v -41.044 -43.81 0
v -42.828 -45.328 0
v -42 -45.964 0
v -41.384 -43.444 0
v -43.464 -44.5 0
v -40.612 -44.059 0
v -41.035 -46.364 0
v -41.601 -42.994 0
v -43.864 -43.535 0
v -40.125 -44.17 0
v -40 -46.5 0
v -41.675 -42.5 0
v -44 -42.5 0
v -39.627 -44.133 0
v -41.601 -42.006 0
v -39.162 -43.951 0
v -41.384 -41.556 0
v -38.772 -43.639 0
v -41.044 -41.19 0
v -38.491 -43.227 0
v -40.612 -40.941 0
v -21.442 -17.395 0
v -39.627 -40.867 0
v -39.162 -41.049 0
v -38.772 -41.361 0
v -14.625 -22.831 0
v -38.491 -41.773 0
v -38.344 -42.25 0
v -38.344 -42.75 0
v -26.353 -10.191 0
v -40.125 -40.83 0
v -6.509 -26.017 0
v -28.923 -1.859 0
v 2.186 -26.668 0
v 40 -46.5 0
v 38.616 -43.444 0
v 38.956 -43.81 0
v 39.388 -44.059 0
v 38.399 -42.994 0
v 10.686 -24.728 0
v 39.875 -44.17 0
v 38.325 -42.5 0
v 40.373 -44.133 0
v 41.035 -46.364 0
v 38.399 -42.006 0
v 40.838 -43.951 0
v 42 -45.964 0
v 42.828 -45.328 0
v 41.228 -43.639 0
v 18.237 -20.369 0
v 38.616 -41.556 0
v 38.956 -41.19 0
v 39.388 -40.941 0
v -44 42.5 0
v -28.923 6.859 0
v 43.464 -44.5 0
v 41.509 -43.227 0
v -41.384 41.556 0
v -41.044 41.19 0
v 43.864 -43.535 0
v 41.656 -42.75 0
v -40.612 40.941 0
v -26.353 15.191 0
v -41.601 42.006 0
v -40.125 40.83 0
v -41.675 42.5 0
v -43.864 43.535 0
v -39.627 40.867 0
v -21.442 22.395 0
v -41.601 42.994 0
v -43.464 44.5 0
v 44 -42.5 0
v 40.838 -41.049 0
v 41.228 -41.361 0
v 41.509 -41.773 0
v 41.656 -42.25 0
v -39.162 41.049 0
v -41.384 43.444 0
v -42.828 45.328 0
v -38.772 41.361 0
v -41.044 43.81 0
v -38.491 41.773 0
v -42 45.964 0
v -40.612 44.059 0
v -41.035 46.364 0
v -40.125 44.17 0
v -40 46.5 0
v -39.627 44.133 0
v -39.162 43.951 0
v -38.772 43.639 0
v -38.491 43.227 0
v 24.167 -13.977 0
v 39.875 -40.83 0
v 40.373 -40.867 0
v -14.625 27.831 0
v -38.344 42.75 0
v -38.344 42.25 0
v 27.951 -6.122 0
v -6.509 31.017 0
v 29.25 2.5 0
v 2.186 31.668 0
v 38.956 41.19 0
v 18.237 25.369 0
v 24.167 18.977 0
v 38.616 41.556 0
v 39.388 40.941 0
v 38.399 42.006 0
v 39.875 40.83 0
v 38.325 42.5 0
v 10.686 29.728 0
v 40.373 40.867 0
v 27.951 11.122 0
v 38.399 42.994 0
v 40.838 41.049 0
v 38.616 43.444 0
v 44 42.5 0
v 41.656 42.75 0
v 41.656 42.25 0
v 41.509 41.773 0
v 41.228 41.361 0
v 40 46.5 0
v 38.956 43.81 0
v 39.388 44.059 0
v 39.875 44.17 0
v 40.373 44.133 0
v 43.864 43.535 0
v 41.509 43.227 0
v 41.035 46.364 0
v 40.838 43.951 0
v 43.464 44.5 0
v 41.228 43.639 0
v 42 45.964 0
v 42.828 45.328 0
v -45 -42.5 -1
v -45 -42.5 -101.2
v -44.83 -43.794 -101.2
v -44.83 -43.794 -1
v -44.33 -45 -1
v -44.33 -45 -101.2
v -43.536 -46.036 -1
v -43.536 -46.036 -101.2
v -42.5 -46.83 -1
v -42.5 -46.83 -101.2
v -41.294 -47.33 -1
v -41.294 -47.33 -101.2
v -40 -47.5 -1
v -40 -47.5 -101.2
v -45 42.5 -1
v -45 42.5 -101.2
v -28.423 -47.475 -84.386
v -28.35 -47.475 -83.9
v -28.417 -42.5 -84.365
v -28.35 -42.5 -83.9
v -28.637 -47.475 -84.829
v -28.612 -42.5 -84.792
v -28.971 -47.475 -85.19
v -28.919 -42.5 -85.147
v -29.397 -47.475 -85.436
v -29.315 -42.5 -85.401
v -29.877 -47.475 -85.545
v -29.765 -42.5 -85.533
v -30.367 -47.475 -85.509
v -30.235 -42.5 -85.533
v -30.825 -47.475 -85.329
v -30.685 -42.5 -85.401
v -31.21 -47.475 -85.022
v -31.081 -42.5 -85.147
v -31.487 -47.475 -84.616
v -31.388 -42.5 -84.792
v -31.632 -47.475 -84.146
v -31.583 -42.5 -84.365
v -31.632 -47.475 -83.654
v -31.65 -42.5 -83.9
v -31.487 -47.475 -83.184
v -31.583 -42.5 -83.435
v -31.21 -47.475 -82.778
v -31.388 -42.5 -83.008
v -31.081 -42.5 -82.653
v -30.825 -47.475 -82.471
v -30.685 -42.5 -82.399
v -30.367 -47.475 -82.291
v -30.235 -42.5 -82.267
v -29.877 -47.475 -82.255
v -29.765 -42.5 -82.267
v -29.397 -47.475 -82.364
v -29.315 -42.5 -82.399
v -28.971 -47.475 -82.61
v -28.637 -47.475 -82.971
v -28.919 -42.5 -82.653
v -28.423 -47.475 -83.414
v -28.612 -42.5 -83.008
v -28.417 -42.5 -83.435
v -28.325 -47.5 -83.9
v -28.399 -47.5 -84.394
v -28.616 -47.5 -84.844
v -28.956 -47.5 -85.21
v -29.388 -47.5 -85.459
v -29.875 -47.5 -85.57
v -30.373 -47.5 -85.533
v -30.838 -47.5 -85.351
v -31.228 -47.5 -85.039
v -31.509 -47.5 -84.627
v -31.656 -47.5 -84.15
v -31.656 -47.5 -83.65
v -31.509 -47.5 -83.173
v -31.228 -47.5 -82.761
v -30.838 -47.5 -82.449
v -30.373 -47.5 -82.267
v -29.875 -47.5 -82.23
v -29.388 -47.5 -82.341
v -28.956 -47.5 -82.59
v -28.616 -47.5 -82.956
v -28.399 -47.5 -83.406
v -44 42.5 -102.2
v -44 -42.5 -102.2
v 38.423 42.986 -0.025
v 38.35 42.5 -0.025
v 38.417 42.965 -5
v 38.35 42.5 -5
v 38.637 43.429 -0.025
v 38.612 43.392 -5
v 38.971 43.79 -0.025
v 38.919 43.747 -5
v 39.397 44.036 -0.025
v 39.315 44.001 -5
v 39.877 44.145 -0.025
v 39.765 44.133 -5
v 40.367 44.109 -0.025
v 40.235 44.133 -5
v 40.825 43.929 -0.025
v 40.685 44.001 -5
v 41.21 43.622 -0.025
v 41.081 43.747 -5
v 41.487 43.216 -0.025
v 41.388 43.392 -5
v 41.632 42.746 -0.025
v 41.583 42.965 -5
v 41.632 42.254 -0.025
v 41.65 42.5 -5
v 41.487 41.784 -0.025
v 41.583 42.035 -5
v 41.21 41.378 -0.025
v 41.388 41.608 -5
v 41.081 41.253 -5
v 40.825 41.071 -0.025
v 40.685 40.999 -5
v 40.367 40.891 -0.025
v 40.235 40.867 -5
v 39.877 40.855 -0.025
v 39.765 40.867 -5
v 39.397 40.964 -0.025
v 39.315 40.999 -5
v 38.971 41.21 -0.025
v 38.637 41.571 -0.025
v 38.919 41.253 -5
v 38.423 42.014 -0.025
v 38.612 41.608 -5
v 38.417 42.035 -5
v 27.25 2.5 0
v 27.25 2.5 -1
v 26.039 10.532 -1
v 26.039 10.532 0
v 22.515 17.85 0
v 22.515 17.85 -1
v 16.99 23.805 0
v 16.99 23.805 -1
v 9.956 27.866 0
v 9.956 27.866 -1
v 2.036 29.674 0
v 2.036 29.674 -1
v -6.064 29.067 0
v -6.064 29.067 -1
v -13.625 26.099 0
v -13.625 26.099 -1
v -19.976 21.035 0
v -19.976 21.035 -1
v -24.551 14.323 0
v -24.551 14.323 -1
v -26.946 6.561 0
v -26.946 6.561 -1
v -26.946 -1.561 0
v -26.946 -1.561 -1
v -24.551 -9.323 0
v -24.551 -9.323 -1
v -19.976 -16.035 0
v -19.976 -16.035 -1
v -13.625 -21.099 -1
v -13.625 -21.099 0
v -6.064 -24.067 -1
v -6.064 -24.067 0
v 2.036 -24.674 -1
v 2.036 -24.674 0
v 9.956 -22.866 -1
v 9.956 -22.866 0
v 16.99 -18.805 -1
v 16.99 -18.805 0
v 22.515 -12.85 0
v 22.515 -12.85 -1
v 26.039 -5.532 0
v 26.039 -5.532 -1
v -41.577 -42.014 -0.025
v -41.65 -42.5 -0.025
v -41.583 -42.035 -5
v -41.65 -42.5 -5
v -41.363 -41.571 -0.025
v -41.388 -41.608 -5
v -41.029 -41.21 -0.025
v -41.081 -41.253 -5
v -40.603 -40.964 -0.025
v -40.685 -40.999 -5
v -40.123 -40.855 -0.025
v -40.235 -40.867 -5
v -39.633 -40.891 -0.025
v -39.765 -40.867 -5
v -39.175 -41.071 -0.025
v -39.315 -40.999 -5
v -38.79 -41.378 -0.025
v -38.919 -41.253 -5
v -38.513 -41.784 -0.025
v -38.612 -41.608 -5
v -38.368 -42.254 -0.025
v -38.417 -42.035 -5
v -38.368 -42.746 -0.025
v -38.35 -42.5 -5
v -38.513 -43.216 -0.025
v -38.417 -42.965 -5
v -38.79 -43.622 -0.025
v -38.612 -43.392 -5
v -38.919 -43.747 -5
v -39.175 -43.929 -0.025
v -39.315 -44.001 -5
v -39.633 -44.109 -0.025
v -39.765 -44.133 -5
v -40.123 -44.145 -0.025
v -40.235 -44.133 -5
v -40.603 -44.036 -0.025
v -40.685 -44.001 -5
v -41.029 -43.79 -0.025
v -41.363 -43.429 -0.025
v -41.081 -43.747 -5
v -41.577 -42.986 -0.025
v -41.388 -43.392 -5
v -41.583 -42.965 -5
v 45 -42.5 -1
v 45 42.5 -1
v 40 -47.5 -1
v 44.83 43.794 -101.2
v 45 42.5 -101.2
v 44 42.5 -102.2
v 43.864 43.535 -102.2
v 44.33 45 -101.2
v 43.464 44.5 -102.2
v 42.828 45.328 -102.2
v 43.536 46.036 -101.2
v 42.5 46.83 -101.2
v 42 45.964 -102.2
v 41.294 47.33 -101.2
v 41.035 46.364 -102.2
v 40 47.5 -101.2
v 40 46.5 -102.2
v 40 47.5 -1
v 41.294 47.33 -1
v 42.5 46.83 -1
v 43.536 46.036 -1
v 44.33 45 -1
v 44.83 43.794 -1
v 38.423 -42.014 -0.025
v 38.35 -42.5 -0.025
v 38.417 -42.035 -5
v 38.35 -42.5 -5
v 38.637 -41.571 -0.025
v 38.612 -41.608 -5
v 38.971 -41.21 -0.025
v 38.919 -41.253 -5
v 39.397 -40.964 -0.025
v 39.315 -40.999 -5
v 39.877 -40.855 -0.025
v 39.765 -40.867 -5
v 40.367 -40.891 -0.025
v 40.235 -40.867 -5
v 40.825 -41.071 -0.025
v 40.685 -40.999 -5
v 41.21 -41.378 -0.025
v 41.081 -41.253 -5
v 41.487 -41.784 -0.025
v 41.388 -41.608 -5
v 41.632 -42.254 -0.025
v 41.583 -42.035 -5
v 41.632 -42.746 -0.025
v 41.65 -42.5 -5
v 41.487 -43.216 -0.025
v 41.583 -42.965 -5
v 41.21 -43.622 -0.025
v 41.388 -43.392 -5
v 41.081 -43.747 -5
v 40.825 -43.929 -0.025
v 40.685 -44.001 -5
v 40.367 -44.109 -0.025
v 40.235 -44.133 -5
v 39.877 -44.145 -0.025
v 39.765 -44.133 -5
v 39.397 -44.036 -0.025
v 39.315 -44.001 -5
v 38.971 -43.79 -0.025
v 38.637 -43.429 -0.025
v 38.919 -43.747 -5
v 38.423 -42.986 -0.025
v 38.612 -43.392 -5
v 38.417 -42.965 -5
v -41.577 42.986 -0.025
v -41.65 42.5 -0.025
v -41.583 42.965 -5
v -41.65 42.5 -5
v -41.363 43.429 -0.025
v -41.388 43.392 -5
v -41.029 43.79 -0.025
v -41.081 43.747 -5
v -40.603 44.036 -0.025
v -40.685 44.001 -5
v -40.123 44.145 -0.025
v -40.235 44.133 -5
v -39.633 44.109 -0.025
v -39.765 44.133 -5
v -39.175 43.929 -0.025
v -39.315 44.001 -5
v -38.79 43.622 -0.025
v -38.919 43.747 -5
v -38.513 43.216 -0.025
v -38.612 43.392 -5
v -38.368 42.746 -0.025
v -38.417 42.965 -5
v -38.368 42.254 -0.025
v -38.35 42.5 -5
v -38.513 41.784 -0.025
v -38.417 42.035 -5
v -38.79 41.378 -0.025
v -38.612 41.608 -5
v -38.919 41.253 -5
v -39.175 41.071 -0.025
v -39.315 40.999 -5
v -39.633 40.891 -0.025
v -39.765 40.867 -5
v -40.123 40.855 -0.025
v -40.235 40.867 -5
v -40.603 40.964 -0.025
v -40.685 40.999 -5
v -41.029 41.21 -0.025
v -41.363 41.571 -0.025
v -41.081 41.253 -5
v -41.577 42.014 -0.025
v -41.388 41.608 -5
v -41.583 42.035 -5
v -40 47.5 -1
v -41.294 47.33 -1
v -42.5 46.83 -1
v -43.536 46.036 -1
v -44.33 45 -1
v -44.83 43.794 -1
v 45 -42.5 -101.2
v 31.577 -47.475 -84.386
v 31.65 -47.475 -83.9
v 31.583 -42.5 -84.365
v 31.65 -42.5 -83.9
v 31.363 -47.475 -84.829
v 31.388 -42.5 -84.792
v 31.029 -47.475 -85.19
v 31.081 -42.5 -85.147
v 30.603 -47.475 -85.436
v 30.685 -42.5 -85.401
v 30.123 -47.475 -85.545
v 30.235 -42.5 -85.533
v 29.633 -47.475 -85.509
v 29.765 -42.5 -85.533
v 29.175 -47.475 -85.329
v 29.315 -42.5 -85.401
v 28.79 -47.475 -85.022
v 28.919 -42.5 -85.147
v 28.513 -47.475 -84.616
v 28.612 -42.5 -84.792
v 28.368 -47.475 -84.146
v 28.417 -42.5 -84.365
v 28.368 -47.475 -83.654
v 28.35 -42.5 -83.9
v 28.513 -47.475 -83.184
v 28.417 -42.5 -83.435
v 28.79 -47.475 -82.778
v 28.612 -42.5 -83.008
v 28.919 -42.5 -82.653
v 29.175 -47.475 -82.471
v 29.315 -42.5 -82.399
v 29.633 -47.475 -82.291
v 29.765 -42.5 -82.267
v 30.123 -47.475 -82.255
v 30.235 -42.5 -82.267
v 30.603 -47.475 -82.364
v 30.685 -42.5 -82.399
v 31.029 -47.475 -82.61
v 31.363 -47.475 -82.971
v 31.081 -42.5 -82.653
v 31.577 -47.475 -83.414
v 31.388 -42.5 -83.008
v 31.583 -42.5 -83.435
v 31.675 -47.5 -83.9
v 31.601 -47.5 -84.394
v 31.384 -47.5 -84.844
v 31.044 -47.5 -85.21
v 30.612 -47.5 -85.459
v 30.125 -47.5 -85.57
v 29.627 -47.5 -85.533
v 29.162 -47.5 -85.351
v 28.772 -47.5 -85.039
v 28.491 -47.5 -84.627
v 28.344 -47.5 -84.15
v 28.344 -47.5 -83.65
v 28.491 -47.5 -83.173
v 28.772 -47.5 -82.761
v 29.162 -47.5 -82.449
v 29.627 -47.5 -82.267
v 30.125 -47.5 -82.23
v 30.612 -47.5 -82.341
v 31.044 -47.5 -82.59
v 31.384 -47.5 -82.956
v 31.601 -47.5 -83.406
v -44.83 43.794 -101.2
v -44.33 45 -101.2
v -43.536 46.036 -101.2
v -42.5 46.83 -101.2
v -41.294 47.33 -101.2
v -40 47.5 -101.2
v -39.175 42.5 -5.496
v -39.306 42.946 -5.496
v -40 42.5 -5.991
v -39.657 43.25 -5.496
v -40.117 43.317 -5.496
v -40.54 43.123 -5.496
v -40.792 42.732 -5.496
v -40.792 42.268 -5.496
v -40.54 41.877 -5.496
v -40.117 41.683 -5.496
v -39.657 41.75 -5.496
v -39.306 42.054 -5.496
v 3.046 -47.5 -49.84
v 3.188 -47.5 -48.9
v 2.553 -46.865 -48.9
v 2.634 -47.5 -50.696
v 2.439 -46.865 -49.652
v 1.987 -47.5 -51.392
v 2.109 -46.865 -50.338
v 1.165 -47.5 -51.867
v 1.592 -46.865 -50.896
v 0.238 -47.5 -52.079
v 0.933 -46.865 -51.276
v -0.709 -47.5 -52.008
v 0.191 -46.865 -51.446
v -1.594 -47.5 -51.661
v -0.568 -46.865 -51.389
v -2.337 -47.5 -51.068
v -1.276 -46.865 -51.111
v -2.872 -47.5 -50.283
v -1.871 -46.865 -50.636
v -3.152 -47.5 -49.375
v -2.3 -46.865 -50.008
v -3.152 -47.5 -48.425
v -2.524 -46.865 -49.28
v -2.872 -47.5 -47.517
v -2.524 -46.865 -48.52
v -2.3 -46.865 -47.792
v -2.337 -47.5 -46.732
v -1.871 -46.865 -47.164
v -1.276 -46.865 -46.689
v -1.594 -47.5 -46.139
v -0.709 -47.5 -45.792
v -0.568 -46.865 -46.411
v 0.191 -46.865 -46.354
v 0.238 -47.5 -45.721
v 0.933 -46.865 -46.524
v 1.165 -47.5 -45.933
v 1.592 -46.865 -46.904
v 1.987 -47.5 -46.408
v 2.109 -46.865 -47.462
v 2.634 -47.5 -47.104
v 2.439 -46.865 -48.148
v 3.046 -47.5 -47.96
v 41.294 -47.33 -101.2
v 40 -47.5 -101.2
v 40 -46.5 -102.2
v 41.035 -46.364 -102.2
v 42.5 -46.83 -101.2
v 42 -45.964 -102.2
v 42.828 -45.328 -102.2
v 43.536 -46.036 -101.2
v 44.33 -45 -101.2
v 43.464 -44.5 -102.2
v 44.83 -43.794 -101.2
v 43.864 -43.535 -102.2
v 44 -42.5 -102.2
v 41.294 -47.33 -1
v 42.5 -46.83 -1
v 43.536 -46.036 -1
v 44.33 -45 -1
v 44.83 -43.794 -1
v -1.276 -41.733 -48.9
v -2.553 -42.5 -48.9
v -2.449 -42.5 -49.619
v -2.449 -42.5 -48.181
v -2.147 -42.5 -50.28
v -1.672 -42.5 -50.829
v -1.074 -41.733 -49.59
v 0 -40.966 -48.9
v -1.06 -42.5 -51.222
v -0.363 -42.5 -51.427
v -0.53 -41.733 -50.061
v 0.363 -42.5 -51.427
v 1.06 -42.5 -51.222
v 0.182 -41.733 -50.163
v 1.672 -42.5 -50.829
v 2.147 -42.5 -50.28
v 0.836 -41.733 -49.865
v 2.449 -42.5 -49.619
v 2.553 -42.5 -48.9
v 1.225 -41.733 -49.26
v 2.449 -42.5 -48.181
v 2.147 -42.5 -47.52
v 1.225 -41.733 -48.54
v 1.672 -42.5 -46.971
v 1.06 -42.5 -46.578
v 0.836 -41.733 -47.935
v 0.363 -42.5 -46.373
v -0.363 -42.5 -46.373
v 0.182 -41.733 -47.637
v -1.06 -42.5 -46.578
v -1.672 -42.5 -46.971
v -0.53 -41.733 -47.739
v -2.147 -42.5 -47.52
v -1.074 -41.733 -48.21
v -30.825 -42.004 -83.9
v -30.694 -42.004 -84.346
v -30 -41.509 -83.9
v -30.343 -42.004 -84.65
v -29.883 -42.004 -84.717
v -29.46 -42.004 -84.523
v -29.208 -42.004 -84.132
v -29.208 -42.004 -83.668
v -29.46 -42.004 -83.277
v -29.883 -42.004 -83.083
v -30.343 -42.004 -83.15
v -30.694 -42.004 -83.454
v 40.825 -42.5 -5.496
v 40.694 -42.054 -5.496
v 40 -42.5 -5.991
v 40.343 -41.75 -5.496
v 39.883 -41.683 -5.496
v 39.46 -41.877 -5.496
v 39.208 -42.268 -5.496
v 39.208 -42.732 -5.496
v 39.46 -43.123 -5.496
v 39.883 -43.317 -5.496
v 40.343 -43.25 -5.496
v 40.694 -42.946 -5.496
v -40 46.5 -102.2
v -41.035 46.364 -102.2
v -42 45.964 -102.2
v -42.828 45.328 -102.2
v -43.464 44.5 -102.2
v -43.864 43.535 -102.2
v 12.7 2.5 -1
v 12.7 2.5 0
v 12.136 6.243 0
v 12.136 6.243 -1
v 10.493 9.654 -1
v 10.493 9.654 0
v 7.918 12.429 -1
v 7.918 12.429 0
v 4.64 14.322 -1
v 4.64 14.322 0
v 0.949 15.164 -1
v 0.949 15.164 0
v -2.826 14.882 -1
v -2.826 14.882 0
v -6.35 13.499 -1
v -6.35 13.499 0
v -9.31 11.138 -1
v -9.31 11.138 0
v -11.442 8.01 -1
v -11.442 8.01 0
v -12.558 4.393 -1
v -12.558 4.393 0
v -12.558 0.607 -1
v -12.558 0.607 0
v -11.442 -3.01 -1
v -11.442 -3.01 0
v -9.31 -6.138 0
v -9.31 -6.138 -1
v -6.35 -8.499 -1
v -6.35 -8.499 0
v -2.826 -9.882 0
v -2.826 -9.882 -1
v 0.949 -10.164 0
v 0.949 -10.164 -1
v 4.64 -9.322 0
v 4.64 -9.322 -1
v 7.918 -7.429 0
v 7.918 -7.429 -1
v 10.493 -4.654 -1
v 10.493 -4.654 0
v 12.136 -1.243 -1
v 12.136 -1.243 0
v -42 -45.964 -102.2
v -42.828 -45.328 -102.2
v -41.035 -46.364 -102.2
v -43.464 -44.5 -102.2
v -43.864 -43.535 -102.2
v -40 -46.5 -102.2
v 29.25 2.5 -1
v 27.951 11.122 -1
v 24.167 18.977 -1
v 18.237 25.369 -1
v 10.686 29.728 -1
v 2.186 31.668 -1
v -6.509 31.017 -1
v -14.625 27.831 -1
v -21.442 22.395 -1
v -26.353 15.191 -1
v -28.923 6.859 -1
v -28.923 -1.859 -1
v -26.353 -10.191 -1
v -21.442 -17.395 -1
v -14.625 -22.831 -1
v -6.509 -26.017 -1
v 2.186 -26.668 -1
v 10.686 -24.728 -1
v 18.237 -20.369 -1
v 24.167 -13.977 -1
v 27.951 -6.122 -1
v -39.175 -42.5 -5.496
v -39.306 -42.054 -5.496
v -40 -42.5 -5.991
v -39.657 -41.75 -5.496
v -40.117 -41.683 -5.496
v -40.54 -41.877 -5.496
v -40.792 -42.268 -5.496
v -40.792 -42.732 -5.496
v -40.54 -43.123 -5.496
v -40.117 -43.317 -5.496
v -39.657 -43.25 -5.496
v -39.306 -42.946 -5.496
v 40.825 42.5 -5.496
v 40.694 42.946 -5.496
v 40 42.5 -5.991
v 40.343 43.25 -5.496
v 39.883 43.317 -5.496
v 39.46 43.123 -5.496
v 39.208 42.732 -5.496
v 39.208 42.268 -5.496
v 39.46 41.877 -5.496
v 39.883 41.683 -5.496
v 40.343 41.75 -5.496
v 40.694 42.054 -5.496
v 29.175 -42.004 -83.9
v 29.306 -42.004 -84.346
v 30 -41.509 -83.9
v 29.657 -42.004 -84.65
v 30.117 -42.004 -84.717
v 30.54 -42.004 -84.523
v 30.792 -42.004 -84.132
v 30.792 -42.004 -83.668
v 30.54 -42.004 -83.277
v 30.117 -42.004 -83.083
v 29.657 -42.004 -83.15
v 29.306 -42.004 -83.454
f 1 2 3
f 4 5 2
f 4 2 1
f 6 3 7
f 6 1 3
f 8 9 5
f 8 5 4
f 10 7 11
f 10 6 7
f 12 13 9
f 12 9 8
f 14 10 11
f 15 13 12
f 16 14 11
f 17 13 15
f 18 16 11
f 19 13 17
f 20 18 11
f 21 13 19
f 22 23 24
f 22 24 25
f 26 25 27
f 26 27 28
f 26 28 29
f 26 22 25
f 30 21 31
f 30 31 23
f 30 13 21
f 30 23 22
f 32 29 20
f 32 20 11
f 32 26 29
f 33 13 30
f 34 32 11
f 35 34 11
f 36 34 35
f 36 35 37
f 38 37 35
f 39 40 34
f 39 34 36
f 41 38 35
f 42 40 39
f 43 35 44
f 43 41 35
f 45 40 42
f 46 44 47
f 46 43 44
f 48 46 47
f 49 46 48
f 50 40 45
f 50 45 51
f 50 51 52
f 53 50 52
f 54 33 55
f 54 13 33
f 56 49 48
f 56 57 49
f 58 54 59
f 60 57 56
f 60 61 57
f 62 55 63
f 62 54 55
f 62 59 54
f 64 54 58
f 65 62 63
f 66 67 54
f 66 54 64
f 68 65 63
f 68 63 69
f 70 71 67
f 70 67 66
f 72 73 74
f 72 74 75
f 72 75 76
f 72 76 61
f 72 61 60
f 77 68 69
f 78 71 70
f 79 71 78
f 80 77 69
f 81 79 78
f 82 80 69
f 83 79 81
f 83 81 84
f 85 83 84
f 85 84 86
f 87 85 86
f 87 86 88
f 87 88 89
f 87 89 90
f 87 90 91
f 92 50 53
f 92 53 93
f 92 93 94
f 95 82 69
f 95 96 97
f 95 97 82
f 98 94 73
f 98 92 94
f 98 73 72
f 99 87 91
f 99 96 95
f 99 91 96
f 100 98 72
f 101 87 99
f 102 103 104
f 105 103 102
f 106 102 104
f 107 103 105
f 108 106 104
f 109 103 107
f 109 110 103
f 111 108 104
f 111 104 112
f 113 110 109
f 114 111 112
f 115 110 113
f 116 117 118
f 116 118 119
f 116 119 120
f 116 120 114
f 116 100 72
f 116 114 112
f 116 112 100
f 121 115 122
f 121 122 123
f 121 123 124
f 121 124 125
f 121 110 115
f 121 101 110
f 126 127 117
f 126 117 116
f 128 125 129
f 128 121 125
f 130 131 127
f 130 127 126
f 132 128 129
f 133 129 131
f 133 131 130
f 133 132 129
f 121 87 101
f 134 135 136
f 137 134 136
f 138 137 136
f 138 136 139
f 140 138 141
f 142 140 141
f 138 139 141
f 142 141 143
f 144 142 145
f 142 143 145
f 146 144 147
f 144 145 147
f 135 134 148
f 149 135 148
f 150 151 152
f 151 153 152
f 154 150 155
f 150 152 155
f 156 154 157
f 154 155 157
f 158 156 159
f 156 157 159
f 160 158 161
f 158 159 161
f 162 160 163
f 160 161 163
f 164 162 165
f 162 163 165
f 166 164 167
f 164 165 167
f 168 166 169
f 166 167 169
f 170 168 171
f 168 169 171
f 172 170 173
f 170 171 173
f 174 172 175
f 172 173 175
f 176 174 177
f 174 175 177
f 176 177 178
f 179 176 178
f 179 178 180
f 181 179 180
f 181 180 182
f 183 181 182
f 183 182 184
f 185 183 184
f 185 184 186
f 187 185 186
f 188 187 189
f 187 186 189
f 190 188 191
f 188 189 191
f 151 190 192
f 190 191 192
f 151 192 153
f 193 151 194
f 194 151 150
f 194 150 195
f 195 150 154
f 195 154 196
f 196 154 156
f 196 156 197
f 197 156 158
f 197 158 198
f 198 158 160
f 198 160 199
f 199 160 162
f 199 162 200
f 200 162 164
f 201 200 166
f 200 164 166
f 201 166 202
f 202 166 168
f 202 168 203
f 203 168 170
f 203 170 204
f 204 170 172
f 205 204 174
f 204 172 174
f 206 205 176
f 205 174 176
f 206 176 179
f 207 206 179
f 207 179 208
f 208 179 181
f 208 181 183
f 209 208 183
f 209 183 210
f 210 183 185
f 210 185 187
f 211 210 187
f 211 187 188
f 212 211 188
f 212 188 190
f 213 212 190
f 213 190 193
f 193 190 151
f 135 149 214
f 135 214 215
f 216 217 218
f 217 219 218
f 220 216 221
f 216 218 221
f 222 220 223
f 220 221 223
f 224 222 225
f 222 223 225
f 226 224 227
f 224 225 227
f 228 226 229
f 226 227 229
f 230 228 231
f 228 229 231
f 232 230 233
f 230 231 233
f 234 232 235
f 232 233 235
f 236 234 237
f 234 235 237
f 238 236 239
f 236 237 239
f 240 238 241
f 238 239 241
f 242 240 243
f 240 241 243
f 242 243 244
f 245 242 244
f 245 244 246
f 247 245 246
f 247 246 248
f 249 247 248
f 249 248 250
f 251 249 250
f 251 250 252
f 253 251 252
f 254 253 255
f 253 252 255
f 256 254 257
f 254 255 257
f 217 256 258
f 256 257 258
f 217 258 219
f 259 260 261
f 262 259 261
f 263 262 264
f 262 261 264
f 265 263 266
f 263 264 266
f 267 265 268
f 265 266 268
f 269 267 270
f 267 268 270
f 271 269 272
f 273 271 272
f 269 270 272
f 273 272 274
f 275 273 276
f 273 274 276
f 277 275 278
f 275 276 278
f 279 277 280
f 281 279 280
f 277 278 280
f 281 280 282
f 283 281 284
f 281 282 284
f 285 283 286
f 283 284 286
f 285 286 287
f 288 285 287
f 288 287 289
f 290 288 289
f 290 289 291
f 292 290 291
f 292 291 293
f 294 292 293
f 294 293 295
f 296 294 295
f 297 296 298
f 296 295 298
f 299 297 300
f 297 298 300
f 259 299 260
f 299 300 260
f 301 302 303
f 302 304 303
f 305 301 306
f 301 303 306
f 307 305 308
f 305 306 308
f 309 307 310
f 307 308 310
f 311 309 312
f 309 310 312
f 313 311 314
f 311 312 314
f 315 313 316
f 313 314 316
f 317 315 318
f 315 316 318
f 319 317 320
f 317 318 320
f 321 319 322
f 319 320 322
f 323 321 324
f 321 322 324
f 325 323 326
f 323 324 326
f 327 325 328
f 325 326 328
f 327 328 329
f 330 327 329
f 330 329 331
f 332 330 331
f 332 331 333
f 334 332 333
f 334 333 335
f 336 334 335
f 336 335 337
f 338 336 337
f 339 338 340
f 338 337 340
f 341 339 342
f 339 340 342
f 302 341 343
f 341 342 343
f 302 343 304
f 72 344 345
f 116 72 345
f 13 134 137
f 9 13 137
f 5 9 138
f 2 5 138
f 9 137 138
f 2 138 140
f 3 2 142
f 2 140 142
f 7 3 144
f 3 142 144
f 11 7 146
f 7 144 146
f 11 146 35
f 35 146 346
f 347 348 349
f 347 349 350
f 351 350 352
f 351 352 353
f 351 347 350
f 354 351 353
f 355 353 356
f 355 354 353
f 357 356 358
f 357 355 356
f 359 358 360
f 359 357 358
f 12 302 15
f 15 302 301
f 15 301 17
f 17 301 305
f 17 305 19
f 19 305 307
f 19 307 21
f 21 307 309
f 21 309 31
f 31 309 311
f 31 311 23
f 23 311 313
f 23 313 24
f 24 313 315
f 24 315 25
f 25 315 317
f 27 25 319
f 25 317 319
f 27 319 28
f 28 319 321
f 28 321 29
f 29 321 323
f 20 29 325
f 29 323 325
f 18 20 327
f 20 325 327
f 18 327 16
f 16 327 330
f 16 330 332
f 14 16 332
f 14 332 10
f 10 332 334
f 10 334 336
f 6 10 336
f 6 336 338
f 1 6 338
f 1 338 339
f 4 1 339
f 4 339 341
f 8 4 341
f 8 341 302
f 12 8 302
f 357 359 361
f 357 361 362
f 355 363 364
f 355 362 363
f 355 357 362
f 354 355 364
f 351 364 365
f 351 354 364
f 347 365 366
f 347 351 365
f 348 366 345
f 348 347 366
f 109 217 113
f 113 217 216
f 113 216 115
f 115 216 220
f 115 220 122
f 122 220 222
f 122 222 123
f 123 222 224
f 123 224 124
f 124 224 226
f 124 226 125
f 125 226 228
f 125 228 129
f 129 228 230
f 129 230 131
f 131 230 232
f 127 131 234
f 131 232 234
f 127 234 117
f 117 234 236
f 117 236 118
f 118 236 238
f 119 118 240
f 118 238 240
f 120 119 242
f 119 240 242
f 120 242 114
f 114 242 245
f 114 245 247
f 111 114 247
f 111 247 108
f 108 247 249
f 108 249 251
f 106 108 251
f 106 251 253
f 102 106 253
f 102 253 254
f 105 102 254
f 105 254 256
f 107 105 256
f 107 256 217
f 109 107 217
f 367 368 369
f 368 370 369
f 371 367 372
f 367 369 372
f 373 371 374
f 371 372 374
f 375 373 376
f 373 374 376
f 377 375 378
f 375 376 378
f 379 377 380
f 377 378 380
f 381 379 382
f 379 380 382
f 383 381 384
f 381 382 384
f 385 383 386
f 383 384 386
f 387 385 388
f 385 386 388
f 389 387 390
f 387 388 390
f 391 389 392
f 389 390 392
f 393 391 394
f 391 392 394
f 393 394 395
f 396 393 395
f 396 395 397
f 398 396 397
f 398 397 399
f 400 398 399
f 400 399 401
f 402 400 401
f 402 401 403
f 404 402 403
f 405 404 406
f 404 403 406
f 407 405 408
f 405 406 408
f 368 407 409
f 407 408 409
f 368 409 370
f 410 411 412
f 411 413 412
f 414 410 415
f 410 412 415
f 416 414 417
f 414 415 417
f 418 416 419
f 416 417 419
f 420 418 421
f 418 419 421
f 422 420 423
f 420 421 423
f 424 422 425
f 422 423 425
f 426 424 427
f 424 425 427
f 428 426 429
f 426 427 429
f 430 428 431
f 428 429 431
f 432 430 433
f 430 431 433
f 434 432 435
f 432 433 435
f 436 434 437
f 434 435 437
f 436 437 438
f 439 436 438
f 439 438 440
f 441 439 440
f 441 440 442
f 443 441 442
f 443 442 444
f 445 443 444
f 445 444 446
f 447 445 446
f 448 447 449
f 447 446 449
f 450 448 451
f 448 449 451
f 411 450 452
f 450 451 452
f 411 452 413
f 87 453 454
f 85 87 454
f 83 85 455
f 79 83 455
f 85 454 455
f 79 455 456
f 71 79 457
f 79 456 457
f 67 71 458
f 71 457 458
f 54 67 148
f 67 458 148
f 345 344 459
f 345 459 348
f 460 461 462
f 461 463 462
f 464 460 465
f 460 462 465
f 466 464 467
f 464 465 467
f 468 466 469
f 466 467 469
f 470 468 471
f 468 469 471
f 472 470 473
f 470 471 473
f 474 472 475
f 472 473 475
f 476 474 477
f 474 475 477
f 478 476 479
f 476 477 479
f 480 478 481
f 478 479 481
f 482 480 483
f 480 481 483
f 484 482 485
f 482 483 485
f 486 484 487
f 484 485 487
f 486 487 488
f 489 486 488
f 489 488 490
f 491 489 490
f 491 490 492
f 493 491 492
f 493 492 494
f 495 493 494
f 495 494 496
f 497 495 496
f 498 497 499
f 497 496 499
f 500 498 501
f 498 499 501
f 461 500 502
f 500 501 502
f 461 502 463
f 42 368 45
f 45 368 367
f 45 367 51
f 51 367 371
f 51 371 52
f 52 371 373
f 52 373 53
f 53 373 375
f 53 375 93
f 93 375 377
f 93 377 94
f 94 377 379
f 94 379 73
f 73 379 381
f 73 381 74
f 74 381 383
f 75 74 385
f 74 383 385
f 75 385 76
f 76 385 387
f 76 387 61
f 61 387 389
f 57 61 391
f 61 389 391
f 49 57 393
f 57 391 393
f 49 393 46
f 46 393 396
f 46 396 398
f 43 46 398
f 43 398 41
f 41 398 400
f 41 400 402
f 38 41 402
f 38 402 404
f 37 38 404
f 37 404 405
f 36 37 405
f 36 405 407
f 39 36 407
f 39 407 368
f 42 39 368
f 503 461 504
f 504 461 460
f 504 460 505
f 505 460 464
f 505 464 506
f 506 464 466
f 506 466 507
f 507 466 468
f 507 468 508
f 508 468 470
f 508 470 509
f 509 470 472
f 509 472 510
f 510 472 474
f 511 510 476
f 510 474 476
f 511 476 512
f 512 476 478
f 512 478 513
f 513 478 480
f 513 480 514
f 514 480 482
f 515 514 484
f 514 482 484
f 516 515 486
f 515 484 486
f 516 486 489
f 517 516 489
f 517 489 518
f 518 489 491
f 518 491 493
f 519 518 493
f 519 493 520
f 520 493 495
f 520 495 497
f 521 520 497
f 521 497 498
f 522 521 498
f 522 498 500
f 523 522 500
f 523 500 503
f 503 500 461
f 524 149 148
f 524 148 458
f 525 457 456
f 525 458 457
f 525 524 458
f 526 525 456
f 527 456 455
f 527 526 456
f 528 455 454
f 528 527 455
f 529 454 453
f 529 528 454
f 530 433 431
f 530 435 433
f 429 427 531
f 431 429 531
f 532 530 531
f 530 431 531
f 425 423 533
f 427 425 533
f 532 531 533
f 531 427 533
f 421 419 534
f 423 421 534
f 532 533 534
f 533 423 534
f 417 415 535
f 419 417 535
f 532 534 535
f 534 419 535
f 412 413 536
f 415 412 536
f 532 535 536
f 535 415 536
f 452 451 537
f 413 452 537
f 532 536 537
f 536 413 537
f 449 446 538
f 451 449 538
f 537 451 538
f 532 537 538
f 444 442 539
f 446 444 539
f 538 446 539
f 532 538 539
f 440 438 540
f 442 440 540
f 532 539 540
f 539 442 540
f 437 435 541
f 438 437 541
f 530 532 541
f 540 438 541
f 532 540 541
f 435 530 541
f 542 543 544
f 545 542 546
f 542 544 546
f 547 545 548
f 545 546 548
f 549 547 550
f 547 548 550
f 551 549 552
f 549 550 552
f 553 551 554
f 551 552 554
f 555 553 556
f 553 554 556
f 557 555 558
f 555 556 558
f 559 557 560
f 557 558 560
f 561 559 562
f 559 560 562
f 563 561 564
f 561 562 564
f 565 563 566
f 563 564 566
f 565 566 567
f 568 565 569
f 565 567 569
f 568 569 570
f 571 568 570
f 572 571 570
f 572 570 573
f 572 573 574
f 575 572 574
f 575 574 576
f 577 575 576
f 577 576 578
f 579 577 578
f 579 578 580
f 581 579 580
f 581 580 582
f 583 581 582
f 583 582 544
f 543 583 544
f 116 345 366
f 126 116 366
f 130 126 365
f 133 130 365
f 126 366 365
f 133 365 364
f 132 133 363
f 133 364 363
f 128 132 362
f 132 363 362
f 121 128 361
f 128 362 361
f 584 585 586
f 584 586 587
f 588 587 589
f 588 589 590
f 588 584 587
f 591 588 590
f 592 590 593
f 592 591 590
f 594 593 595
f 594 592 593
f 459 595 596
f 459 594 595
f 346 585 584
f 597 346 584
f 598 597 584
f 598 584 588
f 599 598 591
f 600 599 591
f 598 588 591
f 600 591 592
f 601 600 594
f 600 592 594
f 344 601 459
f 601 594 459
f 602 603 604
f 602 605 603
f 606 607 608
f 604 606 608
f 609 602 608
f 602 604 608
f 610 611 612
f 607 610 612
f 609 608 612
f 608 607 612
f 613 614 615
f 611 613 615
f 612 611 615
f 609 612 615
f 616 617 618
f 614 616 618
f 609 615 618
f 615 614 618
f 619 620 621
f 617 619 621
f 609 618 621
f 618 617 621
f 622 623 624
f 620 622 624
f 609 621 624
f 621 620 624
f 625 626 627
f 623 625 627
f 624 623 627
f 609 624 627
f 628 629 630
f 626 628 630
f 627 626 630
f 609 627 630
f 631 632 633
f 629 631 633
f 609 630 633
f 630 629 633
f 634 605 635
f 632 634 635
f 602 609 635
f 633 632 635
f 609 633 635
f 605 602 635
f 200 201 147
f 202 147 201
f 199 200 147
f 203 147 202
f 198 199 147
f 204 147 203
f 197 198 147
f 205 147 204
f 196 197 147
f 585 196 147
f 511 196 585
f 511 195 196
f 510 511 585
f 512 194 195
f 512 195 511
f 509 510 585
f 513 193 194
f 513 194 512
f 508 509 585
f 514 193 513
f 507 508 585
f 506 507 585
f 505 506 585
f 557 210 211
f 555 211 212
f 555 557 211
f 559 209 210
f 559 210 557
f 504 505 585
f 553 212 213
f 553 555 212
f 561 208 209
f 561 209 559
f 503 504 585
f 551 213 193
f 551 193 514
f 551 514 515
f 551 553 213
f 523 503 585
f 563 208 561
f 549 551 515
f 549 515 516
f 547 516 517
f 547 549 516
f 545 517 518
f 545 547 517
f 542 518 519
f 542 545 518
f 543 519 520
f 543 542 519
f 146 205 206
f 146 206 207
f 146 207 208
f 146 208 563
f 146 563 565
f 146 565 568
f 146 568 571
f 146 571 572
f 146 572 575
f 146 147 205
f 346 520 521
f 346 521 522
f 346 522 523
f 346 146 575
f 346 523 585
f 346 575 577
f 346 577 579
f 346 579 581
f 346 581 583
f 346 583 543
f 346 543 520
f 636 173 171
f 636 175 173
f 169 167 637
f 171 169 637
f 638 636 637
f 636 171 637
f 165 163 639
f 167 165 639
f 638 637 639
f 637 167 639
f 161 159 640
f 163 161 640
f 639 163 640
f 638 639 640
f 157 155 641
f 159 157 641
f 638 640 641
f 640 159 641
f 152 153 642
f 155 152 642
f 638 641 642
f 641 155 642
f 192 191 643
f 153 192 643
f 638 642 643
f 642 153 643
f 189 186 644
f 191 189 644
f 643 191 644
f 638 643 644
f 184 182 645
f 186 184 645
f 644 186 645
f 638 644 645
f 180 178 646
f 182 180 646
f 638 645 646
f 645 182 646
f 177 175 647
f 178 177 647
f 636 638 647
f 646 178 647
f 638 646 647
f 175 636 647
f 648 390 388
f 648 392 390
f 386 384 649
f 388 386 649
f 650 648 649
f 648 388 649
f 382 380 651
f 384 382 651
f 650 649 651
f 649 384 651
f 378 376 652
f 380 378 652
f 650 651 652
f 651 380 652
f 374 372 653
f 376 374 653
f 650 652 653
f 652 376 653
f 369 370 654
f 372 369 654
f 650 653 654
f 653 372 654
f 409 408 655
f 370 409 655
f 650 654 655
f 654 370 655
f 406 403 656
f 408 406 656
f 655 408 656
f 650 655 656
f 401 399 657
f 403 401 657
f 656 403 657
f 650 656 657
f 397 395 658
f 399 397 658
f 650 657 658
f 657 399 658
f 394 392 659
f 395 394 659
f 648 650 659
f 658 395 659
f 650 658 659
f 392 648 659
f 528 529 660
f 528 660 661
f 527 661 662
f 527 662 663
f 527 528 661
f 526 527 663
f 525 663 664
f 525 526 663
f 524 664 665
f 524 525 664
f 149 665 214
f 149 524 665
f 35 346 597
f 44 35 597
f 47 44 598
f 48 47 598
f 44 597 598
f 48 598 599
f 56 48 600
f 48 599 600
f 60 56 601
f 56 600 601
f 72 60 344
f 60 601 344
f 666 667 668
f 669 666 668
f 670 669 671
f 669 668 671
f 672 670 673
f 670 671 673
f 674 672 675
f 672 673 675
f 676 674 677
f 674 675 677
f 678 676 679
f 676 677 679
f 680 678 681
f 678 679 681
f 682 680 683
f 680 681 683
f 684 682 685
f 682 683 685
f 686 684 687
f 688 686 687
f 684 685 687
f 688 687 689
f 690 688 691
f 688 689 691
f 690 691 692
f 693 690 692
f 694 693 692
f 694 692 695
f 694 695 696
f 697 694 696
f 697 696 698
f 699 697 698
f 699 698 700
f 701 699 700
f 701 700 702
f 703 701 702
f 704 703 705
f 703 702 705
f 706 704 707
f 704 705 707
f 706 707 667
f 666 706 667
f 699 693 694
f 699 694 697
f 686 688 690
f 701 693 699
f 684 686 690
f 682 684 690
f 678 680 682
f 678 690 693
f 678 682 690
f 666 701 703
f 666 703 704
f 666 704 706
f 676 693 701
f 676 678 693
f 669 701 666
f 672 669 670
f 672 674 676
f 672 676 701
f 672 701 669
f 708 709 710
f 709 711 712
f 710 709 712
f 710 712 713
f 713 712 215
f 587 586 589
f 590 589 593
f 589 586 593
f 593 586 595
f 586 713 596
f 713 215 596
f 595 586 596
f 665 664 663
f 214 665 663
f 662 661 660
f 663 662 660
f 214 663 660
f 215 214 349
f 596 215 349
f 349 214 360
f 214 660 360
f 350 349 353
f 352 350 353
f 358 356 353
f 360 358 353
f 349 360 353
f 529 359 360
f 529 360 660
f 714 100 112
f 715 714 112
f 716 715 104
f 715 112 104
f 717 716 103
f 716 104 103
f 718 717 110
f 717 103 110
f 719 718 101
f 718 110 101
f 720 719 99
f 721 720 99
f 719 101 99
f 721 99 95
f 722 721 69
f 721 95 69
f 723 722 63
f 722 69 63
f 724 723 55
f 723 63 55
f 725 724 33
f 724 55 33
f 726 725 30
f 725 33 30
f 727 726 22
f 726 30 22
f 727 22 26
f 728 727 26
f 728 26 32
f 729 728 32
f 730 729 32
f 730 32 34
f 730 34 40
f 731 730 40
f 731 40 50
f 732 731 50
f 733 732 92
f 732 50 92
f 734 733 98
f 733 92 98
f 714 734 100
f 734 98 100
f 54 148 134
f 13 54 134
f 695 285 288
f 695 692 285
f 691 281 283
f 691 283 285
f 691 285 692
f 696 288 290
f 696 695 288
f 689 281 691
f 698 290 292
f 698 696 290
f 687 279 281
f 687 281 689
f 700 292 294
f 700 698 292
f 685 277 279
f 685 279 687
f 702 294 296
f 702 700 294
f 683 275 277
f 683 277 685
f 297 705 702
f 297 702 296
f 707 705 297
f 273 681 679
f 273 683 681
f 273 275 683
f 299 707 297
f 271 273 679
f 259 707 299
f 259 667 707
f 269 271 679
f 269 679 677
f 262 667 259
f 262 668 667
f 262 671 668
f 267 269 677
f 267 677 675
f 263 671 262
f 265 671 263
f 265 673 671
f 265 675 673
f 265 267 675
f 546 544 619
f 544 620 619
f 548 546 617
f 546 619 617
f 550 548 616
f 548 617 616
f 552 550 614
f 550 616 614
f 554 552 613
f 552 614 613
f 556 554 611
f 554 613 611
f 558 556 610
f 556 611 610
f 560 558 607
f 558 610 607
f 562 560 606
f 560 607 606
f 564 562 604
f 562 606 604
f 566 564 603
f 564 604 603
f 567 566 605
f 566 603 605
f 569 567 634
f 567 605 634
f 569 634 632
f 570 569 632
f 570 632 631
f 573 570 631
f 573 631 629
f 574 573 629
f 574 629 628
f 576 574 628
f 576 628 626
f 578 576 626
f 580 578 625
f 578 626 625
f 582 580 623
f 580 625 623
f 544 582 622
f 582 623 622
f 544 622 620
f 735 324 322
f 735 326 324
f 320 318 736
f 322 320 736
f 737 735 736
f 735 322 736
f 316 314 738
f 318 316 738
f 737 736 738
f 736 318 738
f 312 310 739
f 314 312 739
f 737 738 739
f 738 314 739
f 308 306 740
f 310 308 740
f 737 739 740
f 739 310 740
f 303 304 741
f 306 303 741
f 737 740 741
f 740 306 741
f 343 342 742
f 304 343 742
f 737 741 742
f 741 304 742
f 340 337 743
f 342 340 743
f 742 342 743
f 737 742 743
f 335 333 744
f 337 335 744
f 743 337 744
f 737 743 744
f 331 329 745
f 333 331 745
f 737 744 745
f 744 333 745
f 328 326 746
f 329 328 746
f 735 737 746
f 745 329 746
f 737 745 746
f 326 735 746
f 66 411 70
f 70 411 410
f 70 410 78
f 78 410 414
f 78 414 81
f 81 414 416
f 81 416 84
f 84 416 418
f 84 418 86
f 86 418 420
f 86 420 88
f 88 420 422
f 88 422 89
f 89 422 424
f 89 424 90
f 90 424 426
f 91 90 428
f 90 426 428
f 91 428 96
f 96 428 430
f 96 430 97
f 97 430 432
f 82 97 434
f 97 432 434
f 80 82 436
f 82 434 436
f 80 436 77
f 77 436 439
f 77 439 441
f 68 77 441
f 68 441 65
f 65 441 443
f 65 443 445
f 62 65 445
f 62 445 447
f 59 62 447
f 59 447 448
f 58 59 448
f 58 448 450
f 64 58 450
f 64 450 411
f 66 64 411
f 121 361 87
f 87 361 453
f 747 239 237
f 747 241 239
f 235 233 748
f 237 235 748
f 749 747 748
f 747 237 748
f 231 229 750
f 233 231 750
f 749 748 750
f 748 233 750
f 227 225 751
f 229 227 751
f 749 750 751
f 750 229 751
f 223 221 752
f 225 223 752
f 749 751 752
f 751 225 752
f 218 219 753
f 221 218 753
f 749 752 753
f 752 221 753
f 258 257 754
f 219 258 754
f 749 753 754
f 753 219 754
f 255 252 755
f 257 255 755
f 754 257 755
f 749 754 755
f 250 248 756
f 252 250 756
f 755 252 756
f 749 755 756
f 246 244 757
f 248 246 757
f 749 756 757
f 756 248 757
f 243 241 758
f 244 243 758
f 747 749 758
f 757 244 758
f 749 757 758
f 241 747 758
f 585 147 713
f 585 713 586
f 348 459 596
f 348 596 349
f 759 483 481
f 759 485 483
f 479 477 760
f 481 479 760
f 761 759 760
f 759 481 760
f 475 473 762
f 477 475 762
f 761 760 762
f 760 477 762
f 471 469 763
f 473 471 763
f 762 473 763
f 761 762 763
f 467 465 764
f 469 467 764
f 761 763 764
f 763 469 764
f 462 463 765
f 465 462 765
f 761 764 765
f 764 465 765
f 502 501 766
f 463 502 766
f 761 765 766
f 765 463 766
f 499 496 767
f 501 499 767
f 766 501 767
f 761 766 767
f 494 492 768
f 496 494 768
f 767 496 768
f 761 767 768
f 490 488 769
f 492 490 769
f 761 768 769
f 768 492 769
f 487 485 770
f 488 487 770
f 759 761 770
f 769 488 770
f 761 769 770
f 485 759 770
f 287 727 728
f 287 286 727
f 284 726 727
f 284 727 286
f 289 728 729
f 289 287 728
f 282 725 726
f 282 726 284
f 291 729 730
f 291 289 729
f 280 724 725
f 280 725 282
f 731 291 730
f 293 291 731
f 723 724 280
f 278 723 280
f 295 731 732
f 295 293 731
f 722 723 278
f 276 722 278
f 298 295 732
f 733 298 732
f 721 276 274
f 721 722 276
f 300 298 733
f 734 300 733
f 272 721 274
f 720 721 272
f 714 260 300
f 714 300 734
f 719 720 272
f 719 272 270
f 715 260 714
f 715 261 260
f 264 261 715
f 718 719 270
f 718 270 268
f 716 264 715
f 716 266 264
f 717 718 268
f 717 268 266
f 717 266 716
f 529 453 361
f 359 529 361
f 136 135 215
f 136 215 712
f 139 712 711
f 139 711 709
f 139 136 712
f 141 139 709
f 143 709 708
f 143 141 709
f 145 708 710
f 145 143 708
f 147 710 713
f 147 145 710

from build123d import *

# Parameters (mm, degrees)
SKETCH1_W                             = 90
SKETCH1_H                             = 95
BOSS_EXTRUDE1_DEPTH                   = 102.2
SKETCH2_R                             = 29.25
CUT_EXTRUDE1_DEPTH                    = 1
SKETCH3_R                             = 27.25
BOSS_EXTRUDE2_DEPTH                   = 1
TAP_DRILL_FOR_M4_TAP1_D               = 3.3
TAP_DRILL_FOR_M4_TAP1_DEPTH           = 5
TAP_DRILL_FOR_M4_TAP1_CSINK_D         = 3.35
TAP_DRILL_FOR_M4_TAP1_CSINK_ANGLE     = 90
TAP_DRILL_FOR_M4_TAP1_TIP             = 0.991420021
TAP_DRILL_FOR_M4_TAP2_D               = 3.3
TAP_DRILL_FOR_M4_TAP2_DEPTH           = 5
TAP_DRILL_FOR_M4_TAP2_CSINK_D         = 3.35
TAP_DRILL_FOR_M4_TAP2_CSINK_ANGLE     = 90
TAP_DRILL_FOR_M4_TAP2_TIP             = 0.991420021
TAP_DRILL_FOR_1_4_20_TAP1_D           = 5.1054
TAP_DRILL_FOR_1_4_20_TAP1_DEPTH       = 5
TAP_DRILL_FOR_1_4_20_TAP1_CSINK_D     = 6.3754
TAP_DRILL_FOR_1_4_20_TAP1_CSINK_ANGLE = 90
TAP_DRILL_FOR_1_4_20_TAP1_TIP         = 1.533816902
FILLET1_R                             = 5
CHAMFER1_SIZE                         = 1
SKETCH13_R                            = 12.7
CUT_EXTRUDE2_DEPTH                    = 1


with BuildPart() as part:
    # Sketch1 → Boss-Extrude1 (new body)
    with BuildSketch(Plane.XY):
        Rectangle(SKETCH1_W, SKETCH1_H)
    extrude(amount=-BOSS_EXTRUDE1_DEPTH)

    # Sketch2 → Cut-Extrude1 (cut)
    with BuildSketch(Plane.XY):
        with Locations((0, 2.5)):
            Circle(SKETCH2_R)
    extrude(amount=-CUT_EXTRUDE1_DEPTH, mode=Mode.SUBTRACT)

    # Sketch3 → Boss-Extrude2 (add)
    with BuildSketch(Plane.XY.offset(-1)):
        with Locations((0, 2.5)):
            Circle(SKETCH3_R)
    extrude(amount=BOSS_EXTRUDE2_DEPTH)

    # Tap Drill for M4 Tap1
    with Locations(Plane.XY):
        with Locations((-40, 42.5), (40, 42.5), (-40, -42.5), (40, -42.5)):
            CounterSinkHole(TAP_DRILL_FOR_M4_TAP1_D / 2, TAP_DRILL_FOR_M4_TAP1_CSINK_D / 2, depth=TAP_DRILL_FOR_M4_TAP1_DEPTH, counter_sink_angle=TAP_DRILL_FOR_M4_TAP1_CSINK_ANGLE)
            with Locations((0, 0, -(TAP_DRILL_FOR_M4_TAP1_DEPTH + TAP_DRILL_FOR_M4_TAP1_TIP / 2))):  # 118° drill point
                Cone(0, TAP_DRILL_FOR_M4_TAP1_D / 2, TAP_DRILL_FOR_M4_TAP1_TIP, mode=Mode.SUBTRACT)

    # Tap Drill for M4 Tap2
    with Locations(Plane(origin=(0, -47.5, 0), x_dir=(-1, 0, 0), z_dir=(0, -1, 0))):
        with Locations((-30, 83.9), (30, 83.9)):
            CounterSinkHole(TAP_DRILL_FOR_M4_TAP2_D / 2, TAP_DRILL_FOR_M4_TAP2_CSINK_D / 2, depth=TAP_DRILL_FOR_M4_TAP2_DEPTH, counter_sink_angle=TAP_DRILL_FOR_M4_TAP2_CSINK_ANGLE)
            with Locations((0, 0, -(TAP_DRILL_FOR_M4_TAP2_DEPTH + TAP_DRILL_FOR_M4_TAP2_TIP / 2))):  # 118° drill point
                Cone(0, TAP_DRILL_FOR_M4_TAP2_D / 2, TAP_DRILL_FOR_M4_TAP2_TIP, mode=Mode.SUBTRACT)

    # Tap Drill for 1/4-20 Tap1
    with Locations(Plane(origin=(0, -47.5, 0), x_dir=(-1, 0, 0), z_dir=(0, -1, 0))):
        with Locations((0, 48.9)):
            CounterSinkHole(TAP_DRILL_FOR_1_4_20_TAP1_D / 2, TAP_DRILL_FOR_1_4_20_TAP1_CSINK_D / 2, depth=TAP_DRILL_FOR_1_4_20_TAP1_DEPTH, counter_sink_angle=TAP_DRILL_FOR_1_4_20_TAP1_CSINK_ANGLE)
            with Locations((0, 0, -(TAP_DRILL_FOR_1_4_20_TAP1_DEPTH + TAP_DRILL_FOR_1_4_20_TAP1_TIP / 2))):  # 118° drill point
                Cone(0, TAP_DRILL_FOR_1_4_20_TAP1_D / 2, TAP_DRILL_FOR_1_4_20_TAP1_TIP, mode=Mode.SUBTRACT)

    # Fillet1
    fillet1_edges = [part.edges().sort_by_distance(p)[0] for p in [
        (45, -47.5, -51.1),
        (-45, -47.5, -51.1),
        (-45, 47.5, -51.1),
        (45, 47.5, -51.1),
    ]]
    fillet(fillet1_edges, radius=FILLET1_R)

    # Chamfer1
    chamfer1_edges = [part.edges().sort_by_distance(p)[0] for p in [
        (0, -47.5, 0),
        (0, -47.5, -102.2),
        (45, 0, 0),
        (0, 47.5, 0),
        (-45, 0, 0),
        (43.535533906, 46.035533906, 0),
        (-43.535533906, 46.035533906, 0),
        (-43.535533906, -46.035533906, 0),
        (43.535533906, -46.035533906, 0),
        (45, 0, -102.2),
        (-45, 0, -102.2),
        (0, 47.5, -102.2),
        (43.535533906, 46.035533906, -102.2),
        (-43.535533906, 46.035533906, -102.2),
        (-43.535533906, -46.035533906, -102.2),
        (43.535533906, -46.035533906, -102.2),
    ]]
    chamfer(chamfer1_edges, length=CHAMFER1_SIZE)

    # Sketch13 → Cut-Extrude2 (cut)
    with BuildSketch(Plane.XY):
        with Locations((0, 2.5)):
            Circle(SKETCH13_R)
    extrude(amount=-CUT_EXTRUDE2_DEPTH, mode=Mode.SUBTRACT)


solid = part.part
